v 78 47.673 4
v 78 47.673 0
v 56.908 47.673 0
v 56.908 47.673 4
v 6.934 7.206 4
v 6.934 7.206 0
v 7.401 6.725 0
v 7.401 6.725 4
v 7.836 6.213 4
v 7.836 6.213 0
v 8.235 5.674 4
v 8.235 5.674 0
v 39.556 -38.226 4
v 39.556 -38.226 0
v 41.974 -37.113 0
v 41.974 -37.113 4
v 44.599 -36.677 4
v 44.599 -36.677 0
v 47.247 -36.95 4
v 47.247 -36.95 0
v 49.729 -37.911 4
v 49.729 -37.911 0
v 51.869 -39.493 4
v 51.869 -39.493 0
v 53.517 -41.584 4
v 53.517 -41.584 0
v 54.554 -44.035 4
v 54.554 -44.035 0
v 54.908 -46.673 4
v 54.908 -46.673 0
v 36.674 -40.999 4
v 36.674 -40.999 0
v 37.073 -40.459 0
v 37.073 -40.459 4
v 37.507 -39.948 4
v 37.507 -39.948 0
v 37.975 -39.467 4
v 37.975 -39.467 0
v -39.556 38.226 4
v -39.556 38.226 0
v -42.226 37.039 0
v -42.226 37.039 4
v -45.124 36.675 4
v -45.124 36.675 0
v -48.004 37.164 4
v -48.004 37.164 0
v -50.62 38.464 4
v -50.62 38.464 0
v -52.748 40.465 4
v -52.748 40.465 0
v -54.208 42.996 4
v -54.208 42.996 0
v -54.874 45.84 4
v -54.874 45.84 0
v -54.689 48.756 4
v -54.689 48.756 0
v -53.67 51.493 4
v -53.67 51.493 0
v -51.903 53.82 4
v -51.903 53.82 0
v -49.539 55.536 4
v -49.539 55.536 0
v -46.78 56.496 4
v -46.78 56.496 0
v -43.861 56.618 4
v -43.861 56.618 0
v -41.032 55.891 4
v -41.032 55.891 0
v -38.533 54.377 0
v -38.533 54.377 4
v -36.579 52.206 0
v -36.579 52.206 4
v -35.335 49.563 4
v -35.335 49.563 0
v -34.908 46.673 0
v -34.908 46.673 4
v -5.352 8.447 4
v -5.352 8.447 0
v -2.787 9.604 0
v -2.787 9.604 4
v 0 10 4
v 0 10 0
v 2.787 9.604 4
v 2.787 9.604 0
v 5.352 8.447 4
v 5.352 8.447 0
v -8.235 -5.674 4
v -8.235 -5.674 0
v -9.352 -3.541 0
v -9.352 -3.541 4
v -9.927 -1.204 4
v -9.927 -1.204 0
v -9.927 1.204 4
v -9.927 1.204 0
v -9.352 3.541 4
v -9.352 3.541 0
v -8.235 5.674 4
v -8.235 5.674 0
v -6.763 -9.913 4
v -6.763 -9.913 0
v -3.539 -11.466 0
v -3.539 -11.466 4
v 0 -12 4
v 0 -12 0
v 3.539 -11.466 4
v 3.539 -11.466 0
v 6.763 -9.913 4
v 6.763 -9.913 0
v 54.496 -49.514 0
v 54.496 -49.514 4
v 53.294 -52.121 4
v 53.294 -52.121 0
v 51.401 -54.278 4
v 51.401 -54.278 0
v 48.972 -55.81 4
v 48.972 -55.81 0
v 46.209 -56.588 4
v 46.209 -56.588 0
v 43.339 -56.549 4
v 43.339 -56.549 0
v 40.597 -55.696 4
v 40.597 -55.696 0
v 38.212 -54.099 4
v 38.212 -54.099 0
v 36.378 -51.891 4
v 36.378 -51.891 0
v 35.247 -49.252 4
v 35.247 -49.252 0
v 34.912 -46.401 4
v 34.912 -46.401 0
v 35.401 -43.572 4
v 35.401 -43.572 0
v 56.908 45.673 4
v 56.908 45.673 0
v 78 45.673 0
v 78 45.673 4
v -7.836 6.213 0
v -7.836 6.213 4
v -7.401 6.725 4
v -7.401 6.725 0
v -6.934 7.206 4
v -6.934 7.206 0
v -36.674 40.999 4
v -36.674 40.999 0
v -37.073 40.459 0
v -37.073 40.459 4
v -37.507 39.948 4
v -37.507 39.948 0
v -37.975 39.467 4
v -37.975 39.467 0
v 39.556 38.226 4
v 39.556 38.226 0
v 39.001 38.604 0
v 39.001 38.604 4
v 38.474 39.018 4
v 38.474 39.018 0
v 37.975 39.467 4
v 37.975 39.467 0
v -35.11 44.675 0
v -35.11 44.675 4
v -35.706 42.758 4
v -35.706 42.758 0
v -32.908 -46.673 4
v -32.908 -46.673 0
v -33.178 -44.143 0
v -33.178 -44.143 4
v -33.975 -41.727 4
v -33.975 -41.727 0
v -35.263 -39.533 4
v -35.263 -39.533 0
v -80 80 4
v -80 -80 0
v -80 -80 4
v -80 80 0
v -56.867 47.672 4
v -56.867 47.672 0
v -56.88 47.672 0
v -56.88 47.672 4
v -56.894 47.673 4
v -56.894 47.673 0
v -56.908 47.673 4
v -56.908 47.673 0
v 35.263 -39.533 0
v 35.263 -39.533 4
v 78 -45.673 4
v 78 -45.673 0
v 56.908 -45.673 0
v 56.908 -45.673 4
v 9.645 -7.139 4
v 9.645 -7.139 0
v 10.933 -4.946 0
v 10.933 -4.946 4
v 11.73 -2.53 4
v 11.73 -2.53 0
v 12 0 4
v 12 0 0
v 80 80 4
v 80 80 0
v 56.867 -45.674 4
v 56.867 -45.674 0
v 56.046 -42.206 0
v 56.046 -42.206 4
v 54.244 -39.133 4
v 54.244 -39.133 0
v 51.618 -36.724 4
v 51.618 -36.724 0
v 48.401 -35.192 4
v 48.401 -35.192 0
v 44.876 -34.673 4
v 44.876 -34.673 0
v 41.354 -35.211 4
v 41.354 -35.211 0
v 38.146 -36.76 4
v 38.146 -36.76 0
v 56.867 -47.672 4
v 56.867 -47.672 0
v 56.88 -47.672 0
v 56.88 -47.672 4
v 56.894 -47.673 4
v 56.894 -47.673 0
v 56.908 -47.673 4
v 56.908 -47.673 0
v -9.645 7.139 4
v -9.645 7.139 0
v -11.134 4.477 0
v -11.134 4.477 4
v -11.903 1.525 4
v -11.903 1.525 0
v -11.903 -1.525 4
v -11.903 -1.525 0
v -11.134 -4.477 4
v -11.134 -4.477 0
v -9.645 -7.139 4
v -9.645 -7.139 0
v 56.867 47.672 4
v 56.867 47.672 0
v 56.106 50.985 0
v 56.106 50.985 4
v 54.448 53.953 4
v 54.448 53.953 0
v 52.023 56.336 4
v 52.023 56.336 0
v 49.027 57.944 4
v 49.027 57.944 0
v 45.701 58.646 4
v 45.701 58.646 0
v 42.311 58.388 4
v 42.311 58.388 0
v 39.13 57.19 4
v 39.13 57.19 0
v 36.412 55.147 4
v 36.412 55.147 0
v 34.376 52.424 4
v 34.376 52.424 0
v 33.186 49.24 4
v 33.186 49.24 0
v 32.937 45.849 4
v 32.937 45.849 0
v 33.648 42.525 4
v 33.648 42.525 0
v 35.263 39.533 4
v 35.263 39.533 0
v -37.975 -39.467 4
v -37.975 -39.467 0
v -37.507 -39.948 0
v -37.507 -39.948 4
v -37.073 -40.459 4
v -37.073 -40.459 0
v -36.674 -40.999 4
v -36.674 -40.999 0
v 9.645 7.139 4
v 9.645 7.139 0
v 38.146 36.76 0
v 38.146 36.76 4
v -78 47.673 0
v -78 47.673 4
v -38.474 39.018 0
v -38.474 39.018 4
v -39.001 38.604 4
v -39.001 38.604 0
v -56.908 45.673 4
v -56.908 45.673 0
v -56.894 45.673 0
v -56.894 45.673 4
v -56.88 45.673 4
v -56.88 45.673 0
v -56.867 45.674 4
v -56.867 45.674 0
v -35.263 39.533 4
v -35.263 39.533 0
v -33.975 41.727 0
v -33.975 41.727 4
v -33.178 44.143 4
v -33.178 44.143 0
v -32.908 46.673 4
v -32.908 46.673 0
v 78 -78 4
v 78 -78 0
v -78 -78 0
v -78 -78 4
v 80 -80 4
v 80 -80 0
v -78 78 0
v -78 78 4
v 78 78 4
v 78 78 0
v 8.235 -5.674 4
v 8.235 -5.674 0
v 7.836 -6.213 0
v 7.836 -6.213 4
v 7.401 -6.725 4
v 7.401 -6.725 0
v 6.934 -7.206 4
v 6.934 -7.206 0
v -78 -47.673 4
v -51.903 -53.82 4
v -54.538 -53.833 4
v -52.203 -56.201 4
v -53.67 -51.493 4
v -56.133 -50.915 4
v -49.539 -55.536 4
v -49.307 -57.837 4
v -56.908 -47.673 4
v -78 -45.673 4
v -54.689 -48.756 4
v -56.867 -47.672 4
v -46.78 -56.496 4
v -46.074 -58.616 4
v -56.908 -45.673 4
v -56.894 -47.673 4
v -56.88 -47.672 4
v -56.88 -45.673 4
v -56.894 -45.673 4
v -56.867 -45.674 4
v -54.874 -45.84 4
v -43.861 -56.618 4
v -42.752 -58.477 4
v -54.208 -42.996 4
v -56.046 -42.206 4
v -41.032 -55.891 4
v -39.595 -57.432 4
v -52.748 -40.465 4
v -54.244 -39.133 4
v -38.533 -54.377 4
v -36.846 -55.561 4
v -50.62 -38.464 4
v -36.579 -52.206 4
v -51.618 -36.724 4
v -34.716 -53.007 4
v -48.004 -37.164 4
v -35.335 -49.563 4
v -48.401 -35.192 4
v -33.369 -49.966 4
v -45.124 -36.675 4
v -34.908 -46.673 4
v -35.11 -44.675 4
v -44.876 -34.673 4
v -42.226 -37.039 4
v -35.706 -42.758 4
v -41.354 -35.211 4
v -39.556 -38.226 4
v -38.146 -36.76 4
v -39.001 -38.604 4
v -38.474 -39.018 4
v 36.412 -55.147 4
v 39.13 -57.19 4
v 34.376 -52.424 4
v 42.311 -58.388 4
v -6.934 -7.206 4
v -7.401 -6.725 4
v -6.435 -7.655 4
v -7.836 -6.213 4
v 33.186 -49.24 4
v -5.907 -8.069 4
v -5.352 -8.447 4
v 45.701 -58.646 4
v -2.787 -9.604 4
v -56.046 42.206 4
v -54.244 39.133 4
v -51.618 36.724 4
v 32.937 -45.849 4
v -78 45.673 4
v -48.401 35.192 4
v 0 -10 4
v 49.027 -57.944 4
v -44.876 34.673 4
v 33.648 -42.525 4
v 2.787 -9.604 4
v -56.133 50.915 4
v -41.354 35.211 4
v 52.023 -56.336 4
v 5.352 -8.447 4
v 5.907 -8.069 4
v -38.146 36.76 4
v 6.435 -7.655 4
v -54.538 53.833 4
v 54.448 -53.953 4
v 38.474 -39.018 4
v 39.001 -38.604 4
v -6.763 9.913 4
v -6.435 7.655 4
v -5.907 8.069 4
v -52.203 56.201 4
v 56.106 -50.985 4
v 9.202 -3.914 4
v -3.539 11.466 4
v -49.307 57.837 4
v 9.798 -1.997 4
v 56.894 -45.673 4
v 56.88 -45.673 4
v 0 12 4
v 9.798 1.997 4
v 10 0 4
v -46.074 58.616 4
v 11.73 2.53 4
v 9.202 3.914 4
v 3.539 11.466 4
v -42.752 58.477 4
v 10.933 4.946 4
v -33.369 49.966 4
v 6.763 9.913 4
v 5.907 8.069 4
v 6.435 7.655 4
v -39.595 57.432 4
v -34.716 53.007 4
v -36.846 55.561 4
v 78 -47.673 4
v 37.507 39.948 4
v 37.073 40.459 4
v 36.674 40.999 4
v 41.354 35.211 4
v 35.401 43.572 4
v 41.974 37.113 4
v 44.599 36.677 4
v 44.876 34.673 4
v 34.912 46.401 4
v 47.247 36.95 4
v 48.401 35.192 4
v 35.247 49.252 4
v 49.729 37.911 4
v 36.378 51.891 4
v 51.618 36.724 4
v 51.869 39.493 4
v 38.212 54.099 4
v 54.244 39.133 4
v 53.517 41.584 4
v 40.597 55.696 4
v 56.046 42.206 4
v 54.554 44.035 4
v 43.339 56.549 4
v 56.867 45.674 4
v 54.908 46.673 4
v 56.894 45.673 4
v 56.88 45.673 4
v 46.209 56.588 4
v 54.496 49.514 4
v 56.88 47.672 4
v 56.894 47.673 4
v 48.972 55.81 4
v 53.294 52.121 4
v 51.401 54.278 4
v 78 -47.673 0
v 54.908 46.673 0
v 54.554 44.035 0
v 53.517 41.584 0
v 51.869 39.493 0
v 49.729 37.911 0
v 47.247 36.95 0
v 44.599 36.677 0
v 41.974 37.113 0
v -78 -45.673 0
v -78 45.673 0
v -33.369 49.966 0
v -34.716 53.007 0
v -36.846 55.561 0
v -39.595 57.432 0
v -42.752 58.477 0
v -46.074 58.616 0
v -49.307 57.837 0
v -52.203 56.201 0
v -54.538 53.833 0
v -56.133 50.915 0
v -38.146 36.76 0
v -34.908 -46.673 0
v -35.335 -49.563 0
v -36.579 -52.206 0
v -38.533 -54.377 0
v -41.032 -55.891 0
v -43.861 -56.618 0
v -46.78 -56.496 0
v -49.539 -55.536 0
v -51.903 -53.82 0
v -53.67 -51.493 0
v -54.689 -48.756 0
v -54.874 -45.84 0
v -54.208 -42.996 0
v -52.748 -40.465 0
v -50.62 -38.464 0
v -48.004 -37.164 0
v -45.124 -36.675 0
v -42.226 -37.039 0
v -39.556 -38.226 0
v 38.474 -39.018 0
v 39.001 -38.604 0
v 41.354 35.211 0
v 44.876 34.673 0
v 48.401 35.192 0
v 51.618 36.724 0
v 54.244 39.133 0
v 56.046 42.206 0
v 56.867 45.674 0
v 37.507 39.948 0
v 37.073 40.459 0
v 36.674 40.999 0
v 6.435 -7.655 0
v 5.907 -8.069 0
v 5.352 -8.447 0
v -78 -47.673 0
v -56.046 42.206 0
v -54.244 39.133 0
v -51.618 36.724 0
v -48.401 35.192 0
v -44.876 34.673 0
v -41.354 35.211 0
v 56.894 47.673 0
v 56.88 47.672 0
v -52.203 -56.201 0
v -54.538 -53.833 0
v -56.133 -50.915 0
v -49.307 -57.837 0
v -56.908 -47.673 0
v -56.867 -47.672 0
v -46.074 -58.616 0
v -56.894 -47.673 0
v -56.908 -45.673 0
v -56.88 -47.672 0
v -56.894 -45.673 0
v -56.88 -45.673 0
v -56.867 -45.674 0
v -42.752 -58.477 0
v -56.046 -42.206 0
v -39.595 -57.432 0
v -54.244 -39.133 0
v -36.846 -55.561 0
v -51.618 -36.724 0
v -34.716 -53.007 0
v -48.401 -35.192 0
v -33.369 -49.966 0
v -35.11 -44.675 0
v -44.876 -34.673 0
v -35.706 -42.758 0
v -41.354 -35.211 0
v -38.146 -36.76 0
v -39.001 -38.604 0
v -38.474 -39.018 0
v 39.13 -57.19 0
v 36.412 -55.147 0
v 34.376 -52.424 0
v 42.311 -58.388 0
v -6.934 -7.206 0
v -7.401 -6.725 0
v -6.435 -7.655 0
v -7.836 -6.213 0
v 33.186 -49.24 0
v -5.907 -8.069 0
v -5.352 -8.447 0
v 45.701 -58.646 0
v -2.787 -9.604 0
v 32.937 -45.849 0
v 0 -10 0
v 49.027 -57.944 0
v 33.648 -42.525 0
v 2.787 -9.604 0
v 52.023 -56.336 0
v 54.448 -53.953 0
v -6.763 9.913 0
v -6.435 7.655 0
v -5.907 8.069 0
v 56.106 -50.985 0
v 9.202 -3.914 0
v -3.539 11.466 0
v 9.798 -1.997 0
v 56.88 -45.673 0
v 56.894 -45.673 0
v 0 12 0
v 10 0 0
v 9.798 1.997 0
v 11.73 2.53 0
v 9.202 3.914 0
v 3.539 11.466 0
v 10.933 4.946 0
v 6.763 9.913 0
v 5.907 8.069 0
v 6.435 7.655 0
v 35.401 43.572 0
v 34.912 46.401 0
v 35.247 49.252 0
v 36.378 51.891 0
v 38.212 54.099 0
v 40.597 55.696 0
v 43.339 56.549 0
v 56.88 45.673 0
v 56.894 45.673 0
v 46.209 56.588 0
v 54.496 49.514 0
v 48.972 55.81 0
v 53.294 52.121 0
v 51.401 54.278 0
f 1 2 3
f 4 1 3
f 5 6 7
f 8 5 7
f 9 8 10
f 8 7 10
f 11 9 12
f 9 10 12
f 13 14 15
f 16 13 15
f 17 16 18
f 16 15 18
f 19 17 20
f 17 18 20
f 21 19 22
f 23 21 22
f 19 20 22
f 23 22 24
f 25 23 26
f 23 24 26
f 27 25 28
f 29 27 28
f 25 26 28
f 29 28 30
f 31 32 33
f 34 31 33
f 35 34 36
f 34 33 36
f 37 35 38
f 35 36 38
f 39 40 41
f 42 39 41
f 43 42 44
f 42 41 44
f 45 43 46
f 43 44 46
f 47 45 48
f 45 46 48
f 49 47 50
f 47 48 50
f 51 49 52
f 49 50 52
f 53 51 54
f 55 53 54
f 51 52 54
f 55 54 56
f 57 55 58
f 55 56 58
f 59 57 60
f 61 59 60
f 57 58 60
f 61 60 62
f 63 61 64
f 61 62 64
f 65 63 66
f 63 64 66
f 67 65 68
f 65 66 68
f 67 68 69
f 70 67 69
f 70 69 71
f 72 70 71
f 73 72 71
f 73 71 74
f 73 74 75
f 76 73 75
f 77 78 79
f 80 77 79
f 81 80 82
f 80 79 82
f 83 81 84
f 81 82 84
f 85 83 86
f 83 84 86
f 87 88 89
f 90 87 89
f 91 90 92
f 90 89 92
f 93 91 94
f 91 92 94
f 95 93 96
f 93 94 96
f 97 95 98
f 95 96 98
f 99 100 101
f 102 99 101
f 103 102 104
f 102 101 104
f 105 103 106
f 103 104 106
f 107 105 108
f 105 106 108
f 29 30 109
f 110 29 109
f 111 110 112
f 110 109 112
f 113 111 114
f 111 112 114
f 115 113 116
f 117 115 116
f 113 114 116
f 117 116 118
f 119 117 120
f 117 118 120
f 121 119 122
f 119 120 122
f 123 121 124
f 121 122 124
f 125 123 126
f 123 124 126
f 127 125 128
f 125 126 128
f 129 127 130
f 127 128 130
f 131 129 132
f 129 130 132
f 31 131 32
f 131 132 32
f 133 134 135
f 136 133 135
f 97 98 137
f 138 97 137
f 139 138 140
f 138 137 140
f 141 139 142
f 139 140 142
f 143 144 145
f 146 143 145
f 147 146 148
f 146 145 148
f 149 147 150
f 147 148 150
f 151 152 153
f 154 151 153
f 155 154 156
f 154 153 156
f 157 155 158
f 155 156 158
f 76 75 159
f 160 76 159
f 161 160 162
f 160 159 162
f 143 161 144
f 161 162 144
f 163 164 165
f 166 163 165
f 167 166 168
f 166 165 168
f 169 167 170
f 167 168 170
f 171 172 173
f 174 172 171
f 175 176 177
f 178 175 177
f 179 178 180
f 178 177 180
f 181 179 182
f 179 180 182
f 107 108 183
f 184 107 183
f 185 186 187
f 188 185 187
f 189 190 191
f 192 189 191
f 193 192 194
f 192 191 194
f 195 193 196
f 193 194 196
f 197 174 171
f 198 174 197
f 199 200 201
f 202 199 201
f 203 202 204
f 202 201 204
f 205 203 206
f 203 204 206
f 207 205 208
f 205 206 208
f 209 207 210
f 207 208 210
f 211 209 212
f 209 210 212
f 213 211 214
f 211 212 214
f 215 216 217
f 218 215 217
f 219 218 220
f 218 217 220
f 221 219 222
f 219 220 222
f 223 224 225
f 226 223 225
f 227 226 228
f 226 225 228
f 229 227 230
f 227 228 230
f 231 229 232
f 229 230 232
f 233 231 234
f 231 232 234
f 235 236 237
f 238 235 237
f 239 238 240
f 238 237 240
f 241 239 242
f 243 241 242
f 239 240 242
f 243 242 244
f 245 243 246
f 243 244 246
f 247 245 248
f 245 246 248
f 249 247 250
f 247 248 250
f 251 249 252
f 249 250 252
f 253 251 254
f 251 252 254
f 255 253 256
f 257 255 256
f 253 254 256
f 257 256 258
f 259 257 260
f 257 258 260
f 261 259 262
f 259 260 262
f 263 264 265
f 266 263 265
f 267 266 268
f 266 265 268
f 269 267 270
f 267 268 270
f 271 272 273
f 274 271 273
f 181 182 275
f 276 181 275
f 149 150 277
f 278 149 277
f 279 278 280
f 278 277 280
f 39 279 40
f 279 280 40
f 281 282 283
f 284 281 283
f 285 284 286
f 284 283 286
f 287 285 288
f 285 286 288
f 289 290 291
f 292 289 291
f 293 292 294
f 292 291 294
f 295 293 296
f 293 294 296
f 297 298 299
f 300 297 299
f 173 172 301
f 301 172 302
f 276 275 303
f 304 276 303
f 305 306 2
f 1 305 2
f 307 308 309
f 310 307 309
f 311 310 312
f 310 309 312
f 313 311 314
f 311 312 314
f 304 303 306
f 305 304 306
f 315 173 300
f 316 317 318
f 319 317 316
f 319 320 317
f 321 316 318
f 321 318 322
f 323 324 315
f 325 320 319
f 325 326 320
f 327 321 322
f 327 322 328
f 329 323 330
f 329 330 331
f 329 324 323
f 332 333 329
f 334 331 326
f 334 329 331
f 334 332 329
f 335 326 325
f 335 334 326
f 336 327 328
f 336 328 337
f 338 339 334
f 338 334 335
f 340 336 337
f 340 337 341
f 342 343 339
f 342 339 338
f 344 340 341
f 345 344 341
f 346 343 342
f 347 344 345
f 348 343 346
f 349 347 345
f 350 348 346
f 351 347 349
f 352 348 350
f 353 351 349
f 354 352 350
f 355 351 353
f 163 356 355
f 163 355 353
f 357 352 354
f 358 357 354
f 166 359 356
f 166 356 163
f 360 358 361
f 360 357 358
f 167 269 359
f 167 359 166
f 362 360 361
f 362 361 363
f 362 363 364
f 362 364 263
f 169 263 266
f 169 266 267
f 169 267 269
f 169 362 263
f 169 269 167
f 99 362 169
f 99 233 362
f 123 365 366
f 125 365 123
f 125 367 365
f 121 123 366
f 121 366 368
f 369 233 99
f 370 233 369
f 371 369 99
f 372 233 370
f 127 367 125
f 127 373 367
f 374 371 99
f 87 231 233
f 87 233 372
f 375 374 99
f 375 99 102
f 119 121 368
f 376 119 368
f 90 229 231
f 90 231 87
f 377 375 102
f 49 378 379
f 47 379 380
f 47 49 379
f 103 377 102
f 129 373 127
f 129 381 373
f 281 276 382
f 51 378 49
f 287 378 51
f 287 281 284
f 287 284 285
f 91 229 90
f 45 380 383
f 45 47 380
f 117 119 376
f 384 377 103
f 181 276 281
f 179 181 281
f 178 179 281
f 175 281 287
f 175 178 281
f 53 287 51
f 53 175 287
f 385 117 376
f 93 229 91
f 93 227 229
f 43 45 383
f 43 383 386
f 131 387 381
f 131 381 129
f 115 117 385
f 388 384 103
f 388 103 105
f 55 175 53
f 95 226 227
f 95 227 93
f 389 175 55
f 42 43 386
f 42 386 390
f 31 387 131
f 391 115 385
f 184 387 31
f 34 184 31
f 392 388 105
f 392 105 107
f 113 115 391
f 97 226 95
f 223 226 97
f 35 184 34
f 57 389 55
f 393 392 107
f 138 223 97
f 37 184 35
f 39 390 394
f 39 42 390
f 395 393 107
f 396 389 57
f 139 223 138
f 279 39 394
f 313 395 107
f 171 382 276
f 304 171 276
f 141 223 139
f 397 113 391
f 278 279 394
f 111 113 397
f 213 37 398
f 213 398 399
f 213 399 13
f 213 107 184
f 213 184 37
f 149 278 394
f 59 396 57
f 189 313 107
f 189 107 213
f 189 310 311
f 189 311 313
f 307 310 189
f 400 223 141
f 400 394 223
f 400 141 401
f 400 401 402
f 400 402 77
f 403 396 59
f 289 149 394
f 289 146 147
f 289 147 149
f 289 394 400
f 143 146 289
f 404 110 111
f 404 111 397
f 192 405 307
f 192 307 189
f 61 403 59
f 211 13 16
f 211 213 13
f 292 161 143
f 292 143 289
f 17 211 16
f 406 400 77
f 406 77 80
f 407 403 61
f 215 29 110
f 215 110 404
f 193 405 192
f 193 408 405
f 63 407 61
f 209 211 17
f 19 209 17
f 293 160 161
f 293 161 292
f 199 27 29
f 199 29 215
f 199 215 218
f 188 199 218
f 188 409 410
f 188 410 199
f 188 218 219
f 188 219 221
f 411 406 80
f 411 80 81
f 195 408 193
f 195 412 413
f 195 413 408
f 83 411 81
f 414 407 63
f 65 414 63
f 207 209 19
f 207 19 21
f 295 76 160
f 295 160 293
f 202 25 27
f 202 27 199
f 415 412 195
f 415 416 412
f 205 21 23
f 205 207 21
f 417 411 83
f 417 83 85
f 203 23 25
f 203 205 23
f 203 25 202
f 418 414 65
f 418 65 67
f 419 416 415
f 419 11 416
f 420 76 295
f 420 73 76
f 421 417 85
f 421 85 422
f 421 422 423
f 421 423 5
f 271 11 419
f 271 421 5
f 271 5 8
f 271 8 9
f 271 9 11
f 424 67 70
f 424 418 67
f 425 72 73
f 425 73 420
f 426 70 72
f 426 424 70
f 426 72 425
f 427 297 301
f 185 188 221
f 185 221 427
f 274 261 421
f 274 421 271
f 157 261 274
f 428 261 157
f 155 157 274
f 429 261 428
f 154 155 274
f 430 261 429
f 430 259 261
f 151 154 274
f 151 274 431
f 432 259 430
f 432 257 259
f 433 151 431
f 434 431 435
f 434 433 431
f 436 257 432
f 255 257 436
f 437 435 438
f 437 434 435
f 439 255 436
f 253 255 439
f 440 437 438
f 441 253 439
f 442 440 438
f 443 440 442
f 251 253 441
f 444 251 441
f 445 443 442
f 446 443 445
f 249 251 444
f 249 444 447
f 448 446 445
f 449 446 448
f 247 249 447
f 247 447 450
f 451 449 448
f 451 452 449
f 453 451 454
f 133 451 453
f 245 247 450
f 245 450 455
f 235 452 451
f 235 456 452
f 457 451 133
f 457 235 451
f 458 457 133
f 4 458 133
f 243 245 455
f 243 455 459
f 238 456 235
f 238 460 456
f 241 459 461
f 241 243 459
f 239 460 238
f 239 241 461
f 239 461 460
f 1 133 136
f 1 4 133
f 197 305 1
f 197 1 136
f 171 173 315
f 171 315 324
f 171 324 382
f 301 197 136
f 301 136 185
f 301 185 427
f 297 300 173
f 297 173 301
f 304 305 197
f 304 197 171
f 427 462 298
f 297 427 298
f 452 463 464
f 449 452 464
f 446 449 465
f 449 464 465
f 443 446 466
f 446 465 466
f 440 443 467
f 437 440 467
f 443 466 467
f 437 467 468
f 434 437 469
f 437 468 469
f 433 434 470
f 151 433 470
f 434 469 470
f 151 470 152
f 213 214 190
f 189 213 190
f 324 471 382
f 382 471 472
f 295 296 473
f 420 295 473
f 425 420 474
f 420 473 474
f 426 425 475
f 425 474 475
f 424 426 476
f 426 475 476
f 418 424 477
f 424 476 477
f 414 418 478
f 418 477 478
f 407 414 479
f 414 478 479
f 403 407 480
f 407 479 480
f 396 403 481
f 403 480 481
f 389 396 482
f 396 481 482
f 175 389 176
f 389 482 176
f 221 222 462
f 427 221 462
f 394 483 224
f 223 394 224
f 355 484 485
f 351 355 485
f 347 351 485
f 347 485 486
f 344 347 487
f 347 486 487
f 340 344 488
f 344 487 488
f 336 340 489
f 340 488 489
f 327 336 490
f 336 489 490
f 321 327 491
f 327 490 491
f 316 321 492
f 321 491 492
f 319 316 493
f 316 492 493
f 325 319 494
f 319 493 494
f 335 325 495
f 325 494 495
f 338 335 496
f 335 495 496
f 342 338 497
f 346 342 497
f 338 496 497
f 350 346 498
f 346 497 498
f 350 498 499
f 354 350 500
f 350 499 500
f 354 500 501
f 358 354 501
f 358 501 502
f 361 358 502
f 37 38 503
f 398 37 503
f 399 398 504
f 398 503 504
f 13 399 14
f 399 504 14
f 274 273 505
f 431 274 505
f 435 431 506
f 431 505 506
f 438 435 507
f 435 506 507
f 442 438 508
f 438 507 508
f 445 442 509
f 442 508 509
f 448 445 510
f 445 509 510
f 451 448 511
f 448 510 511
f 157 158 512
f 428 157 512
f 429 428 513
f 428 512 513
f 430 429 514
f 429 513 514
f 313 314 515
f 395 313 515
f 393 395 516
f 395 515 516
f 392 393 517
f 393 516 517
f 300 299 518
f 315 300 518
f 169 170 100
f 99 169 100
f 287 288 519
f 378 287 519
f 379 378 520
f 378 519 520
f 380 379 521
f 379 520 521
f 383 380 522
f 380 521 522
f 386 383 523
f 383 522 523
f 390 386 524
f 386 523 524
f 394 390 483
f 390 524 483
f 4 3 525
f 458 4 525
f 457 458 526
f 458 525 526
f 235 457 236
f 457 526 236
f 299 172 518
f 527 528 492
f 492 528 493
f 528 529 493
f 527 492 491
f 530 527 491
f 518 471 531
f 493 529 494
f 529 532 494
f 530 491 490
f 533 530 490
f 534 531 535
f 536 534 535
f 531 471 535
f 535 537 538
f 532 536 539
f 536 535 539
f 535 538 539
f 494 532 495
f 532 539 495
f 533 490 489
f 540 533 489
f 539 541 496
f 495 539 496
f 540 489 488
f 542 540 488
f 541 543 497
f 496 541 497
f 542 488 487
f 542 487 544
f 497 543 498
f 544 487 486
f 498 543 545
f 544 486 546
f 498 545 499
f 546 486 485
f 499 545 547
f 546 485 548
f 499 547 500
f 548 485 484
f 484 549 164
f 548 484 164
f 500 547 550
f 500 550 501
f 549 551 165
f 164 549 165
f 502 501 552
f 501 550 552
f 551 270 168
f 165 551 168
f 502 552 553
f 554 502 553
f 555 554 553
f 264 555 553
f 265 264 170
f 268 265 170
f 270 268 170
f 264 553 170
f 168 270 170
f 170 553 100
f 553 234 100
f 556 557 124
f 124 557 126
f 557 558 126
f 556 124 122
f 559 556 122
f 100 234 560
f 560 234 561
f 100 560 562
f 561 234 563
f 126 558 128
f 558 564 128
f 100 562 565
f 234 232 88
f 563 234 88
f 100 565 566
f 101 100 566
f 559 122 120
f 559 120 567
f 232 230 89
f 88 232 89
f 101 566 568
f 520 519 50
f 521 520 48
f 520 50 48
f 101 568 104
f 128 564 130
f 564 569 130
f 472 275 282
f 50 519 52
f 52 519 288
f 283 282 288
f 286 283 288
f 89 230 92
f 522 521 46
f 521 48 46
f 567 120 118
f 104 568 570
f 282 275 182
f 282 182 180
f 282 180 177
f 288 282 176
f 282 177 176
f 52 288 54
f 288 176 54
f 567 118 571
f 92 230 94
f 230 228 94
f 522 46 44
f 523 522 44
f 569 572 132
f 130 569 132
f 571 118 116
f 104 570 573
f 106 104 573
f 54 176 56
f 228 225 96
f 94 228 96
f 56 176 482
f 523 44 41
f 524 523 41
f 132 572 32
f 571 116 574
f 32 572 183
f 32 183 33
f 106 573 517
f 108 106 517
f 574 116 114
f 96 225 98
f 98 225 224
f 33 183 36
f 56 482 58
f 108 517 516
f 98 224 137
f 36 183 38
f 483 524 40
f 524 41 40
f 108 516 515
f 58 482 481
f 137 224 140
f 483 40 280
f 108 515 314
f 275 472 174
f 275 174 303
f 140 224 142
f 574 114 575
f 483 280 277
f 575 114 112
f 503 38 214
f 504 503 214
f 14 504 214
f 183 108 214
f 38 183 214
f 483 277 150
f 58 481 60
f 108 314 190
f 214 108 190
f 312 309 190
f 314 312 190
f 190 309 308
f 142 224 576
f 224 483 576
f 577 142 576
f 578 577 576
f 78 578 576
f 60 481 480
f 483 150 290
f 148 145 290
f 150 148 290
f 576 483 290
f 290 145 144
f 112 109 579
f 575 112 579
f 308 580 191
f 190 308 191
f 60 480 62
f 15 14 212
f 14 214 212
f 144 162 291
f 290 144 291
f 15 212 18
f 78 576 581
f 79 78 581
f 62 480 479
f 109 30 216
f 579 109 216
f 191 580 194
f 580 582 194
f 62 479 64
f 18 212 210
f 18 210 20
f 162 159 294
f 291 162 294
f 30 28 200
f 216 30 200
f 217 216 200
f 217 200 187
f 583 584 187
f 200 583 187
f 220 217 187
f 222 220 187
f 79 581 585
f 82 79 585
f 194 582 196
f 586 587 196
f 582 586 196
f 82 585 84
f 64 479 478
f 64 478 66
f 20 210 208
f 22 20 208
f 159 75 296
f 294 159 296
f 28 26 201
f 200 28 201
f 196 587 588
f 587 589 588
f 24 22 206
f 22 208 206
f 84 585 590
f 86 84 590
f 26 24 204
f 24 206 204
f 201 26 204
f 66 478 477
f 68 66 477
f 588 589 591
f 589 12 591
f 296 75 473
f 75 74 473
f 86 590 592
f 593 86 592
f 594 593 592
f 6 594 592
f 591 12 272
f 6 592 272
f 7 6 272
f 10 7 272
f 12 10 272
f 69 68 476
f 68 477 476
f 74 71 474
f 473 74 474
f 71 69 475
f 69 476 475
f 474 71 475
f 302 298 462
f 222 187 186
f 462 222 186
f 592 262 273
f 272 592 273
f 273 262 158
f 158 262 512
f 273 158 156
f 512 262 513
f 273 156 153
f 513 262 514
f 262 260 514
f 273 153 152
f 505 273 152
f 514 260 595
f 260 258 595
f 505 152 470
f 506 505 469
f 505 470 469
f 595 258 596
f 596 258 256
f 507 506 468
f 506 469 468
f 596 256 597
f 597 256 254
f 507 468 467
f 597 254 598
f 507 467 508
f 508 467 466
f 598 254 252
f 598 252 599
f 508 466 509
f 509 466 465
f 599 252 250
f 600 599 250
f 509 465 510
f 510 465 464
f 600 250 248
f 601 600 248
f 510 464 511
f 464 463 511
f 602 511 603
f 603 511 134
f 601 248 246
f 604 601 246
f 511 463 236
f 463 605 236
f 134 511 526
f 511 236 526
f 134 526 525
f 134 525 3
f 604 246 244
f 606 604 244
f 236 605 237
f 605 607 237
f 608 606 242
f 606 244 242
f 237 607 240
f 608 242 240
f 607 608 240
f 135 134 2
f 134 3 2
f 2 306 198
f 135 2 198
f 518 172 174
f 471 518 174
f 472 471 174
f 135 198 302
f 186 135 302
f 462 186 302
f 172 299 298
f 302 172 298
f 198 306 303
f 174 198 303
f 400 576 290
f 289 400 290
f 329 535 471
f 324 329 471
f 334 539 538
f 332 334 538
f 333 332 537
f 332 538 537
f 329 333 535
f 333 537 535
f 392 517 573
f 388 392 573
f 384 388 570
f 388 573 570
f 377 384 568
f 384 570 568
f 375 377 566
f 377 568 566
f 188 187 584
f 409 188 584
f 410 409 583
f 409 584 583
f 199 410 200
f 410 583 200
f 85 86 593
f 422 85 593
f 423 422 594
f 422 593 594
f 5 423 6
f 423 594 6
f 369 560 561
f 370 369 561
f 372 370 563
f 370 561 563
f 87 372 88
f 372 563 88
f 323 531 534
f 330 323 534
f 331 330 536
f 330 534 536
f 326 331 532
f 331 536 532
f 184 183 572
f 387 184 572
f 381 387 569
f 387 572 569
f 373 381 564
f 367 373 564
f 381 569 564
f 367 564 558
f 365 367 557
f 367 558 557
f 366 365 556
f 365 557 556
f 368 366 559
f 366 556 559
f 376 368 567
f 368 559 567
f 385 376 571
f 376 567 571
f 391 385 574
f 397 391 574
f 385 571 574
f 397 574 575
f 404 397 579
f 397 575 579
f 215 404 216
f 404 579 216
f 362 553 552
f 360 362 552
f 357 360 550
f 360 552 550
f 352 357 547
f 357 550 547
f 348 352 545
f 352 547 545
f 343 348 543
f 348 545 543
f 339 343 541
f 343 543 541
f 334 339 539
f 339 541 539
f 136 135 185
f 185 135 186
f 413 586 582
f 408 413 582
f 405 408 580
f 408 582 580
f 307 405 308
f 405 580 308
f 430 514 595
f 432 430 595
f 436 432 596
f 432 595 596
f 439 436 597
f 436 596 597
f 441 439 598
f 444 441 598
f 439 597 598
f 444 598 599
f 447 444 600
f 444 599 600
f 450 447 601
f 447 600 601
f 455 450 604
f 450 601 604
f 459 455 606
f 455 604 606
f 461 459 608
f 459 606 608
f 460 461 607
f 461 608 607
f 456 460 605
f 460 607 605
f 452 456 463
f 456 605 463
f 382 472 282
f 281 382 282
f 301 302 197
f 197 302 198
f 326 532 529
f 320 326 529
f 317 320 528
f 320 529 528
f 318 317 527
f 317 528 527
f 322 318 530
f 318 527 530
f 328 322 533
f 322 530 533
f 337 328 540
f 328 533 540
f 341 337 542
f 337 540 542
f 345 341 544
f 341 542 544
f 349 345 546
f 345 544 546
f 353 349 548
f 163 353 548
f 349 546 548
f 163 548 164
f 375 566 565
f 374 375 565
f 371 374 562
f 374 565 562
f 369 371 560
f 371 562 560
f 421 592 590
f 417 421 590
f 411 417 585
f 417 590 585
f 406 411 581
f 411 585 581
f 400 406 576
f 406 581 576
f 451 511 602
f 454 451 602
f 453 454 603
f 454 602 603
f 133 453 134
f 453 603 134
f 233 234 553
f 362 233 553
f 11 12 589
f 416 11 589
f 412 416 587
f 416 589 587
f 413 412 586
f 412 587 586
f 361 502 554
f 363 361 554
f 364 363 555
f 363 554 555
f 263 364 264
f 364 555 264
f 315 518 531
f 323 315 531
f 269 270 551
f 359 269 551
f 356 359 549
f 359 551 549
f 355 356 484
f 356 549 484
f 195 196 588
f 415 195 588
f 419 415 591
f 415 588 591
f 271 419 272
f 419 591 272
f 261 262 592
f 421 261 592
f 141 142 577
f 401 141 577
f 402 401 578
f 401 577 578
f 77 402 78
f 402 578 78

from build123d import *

# Parameters (mm, degrees)
F0_W     = 160
F0_H     = 160
F1_DEPTH = 4


with BuildPart() as f1:
    # F0 (on Top) → F1 (new body)
    with BuildSketch(Plane.XY):
        Rectangle(F0_W, F0_H)
        Polygon((78, -47.6726496816), (78, -78), (-78, -78), (-78, -47.6726496816), (-78, -45.6726496816), (-78, 45.6726496816), (-78, 47.6726496816), (-78, 78), (78, 78), (78, 47.6726496816), (78, 45.6726496816), (78, -45.6726496816), align=None, mode=Mode.SUBTRACT)
        with BuildLine():
            Line((-36.673598985, -40.9989881886), (-35.2631757885, -39.5331510668))
            ThreePointArc((-35.2631757885, -39.5331510668), (-35.8940102443, -38.7515774449), (-36.5879950856, -38.0254958538))
            Line((-36.5879950856, -38.0254958538), (-37.9747051278, -39.4666881584))
            ThreePointArc((-37.9747051278, -39.4666881584), (-37.2855518522, -40.2000619797), (-36.673598985, -40.9989881886))
        make_face()
        with BuildLine():
            ThreePointArc((-36.5879950856, -38.0254958538), (-37.3402685176, -37.3599929459), (-38.1455603978, -36.7597309824))
            Line((-38.1455603978, -36.7597309824), (-39.5559835942, -38.2255681043))
            ThreePointArc((-39.5559835942, -38.2255681043), (-38.7340792781, -38.8062941103), (-37.9747051278, -39.4666881584))
            Line((-37.9747051278, -39.4666881584), (-36.5879950856, -38.0254958538))
        make_face()
        with BuildLine():
            ThreePointArc((-56.866588672, -45.6735181142), (-56.9082553387, -46.6726496816), (-56.866588672, -47.6717812489))
            ThreePointArc((-56.866588672, -47.6717812489), (-44.4082553387, -58.6622284898), (-32.9082553387, -46.6726496816))
            ThreePointArc((-32.9082553387, -46.6726496816), (-33.5121824492, -42.9137239442), (-35.2631757885, -39.5331510668))
            Line((-35.2631757885, -39.5331510668), (-36.673598985, -40.9989881886))
            ThreePointArc((-36.673598985, -40.9989881886), (-35.3597852116, -43.7016703428), (-34.9082553387, -46.6726496816))
            ThreePointArc((-34.9082553387, -46.6726496816), (-53.6696113252, -51.4932970736), (-39.5559835942, -38.2255681043))
            Line((-39.5559835942, -38.2255681043), (-38.1455603978, -36.7597309824))
            ThreePointArc((-38.1455603978, -36.7597309824), (-50.0669920866, -35.83810146), (-56.866588672, -45.6735181142))
        make_face()
        with BuildLine():
            Line((8.2346563537, 5.673661493), (9.6450795502, 7.1394986148))
            ThreePointArc((9.6450795502, 7.1394986148), (9.0142450944, 7.9210722367), (8.3202602531, 8.6471538278))
            Line((8.3202602531, 8.6471538278), (6.9335502109, 7.2059615232))
            ThreePointArc((6.9335502109, 7.2059615232), (7.6227034864, 6.4725877018), (8.2346563537, 5.673661493))
        make_face()
        with BuildLine():
            ThreePointArc((8.3202602531, 8.6471538278), (7.567986821, 9.3126567357), (6.7626949409, 9.9129186992))
            Line((6.7626949409, 9.9129186992), (5.3522717444, 8.4470815773))
            ThreePointArc((5.3522717444, 8.4470815773), (6.1741760605, 7.8663555713), (6.9335502109, 7.2059615232))
            Line((6.9335502109, 7.2059615232), (8.3202602531, 8.6471538278))
        make_face()
        with BuildLine():
            Line((5.3522717444, 8.4470815773), (6.7626949409, 9.9129186992))
            ThreePointArc((6.7626949409, 9.9129186992), (0, 12), (-6.7626949409, 9.9129186992))
            Line((-6.7626949409, 9.9129186992), (-5.3522717444, 8.4470815773))
            ThreePointArc((-5.3522717444, 8.4470815773), (0, 10), (5.3522717444, 8.4470815773))
        make_face()
        with BuildLine():
            ThreePointArc((-6.7626949409, 9.9129186992), (-7.567986821, 9.3126567357), (-8.3202602531, 8.6471538278))
            Line((-8.3202602531, 8.6471538278), (-6.9335502109, 7.2059615232))
            ThreePointArc((-6.9335502109, 7.2059615232), (-6.1741760605, 7.8663555713), (-5.3522717444, 8.4470815773))
            Line((-5.3522717444, 8.4470815773), (-6.7626949409, 9.9129186992))
        make_face()
        with BuildLine():
            ThreePointArc((-8.3202602531, 8.6471538278), (-9.0142450944, 7.9210722367), (-9.6450795502, 7.1394986148))
            Line((-9.6450795502, 7.1394986148), (-8.2346563537, 5.673661493))
            ThreePointArc((-8.2346563537, 5.673661493), (-7.6227034864, 6.4725877018), (-6.9335502109, 7.2059615232))
            Line((-6.9335502109, 7.2059615232), (-8.3202602531, 8.6471538278))
        make_face()
        with BuildLine():
            ThreePointArc((-9.6450795502, 7.1394986148), (-12, 0), (-9.6450795502, -7.1394986148))
            Line((-9.6450795502, -7.1394986148), (-8.2346563537, -5.673661493))
            ThreePointArc((-8.2346563537, -5.673661493), (-10, 0), (-8.2346563537, 5.673661493))
            Line((-8.2346563537, 5.673661493), (-9.6450795502, 7.1394986148))
        make_face()
        with BuildLine():
            Line((-8.2346563537, -5.673661493), (-9.6450795502, -7.1394986148))
            ThreePointArc((-9.6450795502, -7.1394986148), (-9.0142450944, -7.9210722367), (-8.3202602531, -8.6471538278))
            Line((-8.3202602531, -8.6471538278), (-6.9335502109, -7.2059615232))
            ThreePointArc((-6.9335502109, -7.2059615232), (-7.6227034864, -6.4725877018), (-8.2346563537, -5.673661493))
        make_face()
        with BuildLine():
            ThreePointArc((-8.3202602531, -8.6471538278), (-7.567986821, -9.3126567357), (-6.7626949409, -9.9129186992))
            Line((-6.7626949409, -9.9129186992), (-5.3522717444, -8.4470815773))
            ThreePointArc((-5.3522717444, -8.4470815773), (-6.1741760605, -7.8663555713), (-6.9335502109, -7.2059615232))
            Line((-6.9335502109, -7.2059615232), (-8.3202602531, -8.6471538278))
        make_face()
        with BuildLine():
            ThreePointArc((-6.7626949409, -9.9129186992), (0, -12), (6.7626949409, -9.9129186992))
            Line((6.7626949409, -9.9129186992), (5.3522717444, -8.4470815773))
            ThreePointArc((5.3522717444, -8.4470815773), (0, -10), (-5.3522717444, -8.4470815773))
            Line((-5.3522717444, -8.4470815773), (-6.7626949409, -9.9129186992))
        make_face()
        with BuildLine():
            Line((5.3522717444, -8.4470815773), (6.7626949409, -9.9129186992))
            ThreePointArc((6.7626949409, -9.9129186992), (7.567986821, -9.3126567357), (8.3202602531, -8.6471538278))
            Line((8.3202602531, -8.6471538278), (6.9335502109, -7.2059615232))
            ThreePointArc((6.9335502109, -7.2059615232), (6.1741760605, -7.8663555713), (5.3522717444, -8.4470815773))
        make_face()
        with BuildLine():
            ThreePointArc((8.3202602531, -8.6471538278), (9.0142450944, -7.9210722367), (9.6450795502, -7.1394986148))
            Line((9.6450795502, -7.1394986148), (8.2346563537, -5.673661493))
            ThreePointArc((8.2346563537, -5.673661493), (7.6227034864, -6.4725877018), (6.9335502109, -7.2059615232))
            Line((6.9335502109, -7.2059615232), (8.3202602531, -8.6471538278))
        make_face()
        with BuildLine():
            Line((8.2346563537, -5.673661493), (9.6450795502, -7.1394986148))
            ThreePointArc((9.6450795502, -7.1394986148), (11.3960728894, -3.7589257374), (12, 0))
            ThreePointArc((12, 0), (11.3960728894, 3.7589257374), (9.6450795502, 7.1394986148))
            Line((9.6450795502, 7.1394986148), (8.2346563537, 5.673661493))
            ThreePointArc((8.2346563537, 5.673661493), (9.5484701271, 2.9709793388), (10, 0))
            ThreePointArc((10, 0), (9.5484701271, -2.9709793388), (8.2346563537, -5.673661493))
        make_face()
        with BuildLine():
            Line((39.5559835942, -38.2255681043), (38.1455603978, -36.7597309824))
            ThreePointArc((38.1455603978, -36.7597309824), (37.3402685176, -37.3599929459), (36.5879950856, -38.0254958538))
            Line((36.5879950856, -38.0254958538), (37.9747051278, -39.4666881584))
            ThreePointArc((37.9747051278, -39.4666881584), (38.7340792781, -38.8062941103), (39.5559835942, -38.2255681043))
        make_face()
        with BuildLine():
            ThreePointArc((36.5879950856, -38.0254958538), (35.8940102443, -38.7515774449), (35.2631757885, -39.5331510668))
            Line((35.2631757885, -39.5331510668), (36.673598985, -40.9989881886))
            ThreePointArc((36.673598985, -40.9989881886), (37.2855518522, -40.2000619797), (37.9747051278, -39.4666881584))
            Line((37.9747051278, -39.4666881584), (36.5879950856, -38.0254958538))
        make_face()
        with BuildLine():
            ThreePointArc((35.2631757885, -39.5331510668), (40.6777576047, -57.9022039436), (56.866588672, -47.6717812489))
            ThreePointArc((56.866588672, -47.6717812489), (56.897834147, -47.1726496816), (56.9082553387, -46.6726496816))
            ThreePointArc((56.9082553387, -46.6726496816), (56.897834147, -46.1726496816), (56.866588672, -45.6735181142))
            ThreePointArc((56.866588672, -45.6735181142), (50.0669920866, -35.83810146), (38.1455603978, -36.7597309824))
            Line((38.1455603978, -36.7597309824), (39.5559835942, -38.2255681043))
            ThreePointArc((39.5559835942, -38.2255681043), (49.7289027307, -37.9112936951), (54.9082553387, -46.6726496816))
            ThreePointArc((54.9082553387, -46.6726496816), (41.9372759999, -56.2211198087), (36.673598985, -40.9989881886))
            Line((36.673598985, -40.9989881886), (35.2631757885, -39.5331510668))
        make_face()
        with BuildLine():
            Line((36.673598985, 40.9989881886), (35.2631757885, 39.5331510668))
            ThreePointArc((35.2631757885, 39.5331510668), (35.8940102443, 38.7515774449), (36.5879950856, 38.0254958538))
            Line((36.5879950856, 38.0254958538), (37.9747051278, 39.4666881584))
            ThreePointArc((37.9747051278, 39.4666881584), (37.2855518522, 40.2000619797), (36.673598985, 40.9989881886))
        make_face()
        with BuildLine():
            ThreePointArc((36.5879950856, 38.0254958538), (37.3402685176, 37.3599929459), (38.1455603978, 36.7597309824))
            Line((38.1455603978, 36.7597309824), (39.5559835942, 38.2255681043))
            ThreePointArc((39.5559835942, 38.2255681043), (38.7340792781, 38.8062941103), (37.9747051278, 39.4666881584))
            Line((37.9747051278, 39.4666881584), (36.5879950856, 38.0254958538))
        make_face()
        with BuildLine():
            ThreePointArc((38.1455603978, 36.7597309824), (50.0669920866, 35.83810146), (56.866588672, 45.6735181142))
            ThreePointArc((56.866588672, 45.6735181142), (56.897834147, 46.1726496816), (56.9082553387, 46.6726496816))
            ThreePointArc((56.9082553387, 46.6726496816), (56.897834147, 47.1726496816), (56.866588672, 47.6717812489))
            ThreePointArc((56.866588672, 47.6717812489), (40.6777576047, 57.9022039436), (35.2631757885, 39.5331510668))
            Line((35.2631757885, 39.5331510668), (36.673598985, 40.9989881886))
            ThreePointArc((36.673598985, 40.9989881886), (41.9372759999, 56.2211198087), (54.9082553387, 46.6726496816))
            ThreePointArc((54.9082553387, 46.6726496816), (49.7289027307, 37.9112936951), (39.5559835942, 38.2255681043))
            Line((39.5559835942, 38.2255681043), (38.1455603978, 36.7597309824))
        make_face()
        with BuildLine():
            Line((-39.5559835942, 38.2255681043), (-38.1455603978, 36.7597309824))
            ThreePointArc((-38.1455603978, 36.7597309824), (-37.3402685176, 37.3599929459), (-36.5879950856, 38.0254958538))
            Line((-36.5879950856, 38.0254958538), (-37.9747051278, 39.4666881584))
            ThreePointArc((-37.9747051278, 39.4666881584), (-38.7340792781, 38.8062941103), (-39.5559835942, 38.2255681043))
        make_face()
        with BuildLine():
            Line((-37.9747051278, 39.4666881584), (-36.5879950856, 38.0254958538))
            ThreePointArc((-36.5879950856, 38.0254958538), (-35.8940102443, 38.7515774449), (-35.2631757885, 39.5331510668))
            Line((-35.2631757885, 39.5331510668), (-36.673598985, 40.9989881886))
            ThreePointArc((-36.673598985, 40.9989881886), (-37.2855518522, 40.2000619797), (-37.9747051278, 39.4666881584))
        make_face()
        with BuildLine():
            ThreePointArc((-56.866588672, 47.6717812489), (-56.9082553387, 46.6726496816), (-56.866588672, 45.6735181142))
            ThreePointArc((-56.866588672, 45.6735181142), (-50.0669920866, 35.83810146), (-38.1455603978, 36.7597309824))
            Line((-38.1455603978, 36.7597309824), (-39.5559835942, 38.2255681043))
            ThreePointArc((-39.5559835942, 38.2255681043), (-53.6696113252, 51.4932970736), (-34.9082553387, 46.6726496816))
            ThreePointArc((-34.9082553387, 46.6726496816), (-35.3597852116, 43.7016703428), (-36.673598985, 40.9989881886))
            Line((-36.673598985, 40.9989881886), (-35.2631757885, 39.5331510668))
            ThreePointArc((-35.2631757885, 39.5331510668), (-33.5121824492, 42.9137239442), (-32.9082553387, 46.6726496816))
            ThreePointArc((-32.9082553387, 46.6726496816), (-44.4082553387, 58.6622284898), (-56.866588672, 47.6717812489))
        make_face()
        with BuildLine():
            ThreePointArc((-36.5879950856, 38.0254958538), (-37.3402685176, 37.3599929459), (-38.1455603978, 36.7597309824))
            Line((-38.1455603978, 36.7597309824), (-9.6450795502, 7.1394986148))
            ThreePointArc((-9.6450795502, 7.1394986148), (-9.0142450944, 7.9210722367), (-8.3202602531, 8.6471538278))
            Line((-8.3202602531, 8.6471538278), (-36.5879950856, 38.0254958538))
        make_face()
        with BuildLine():
            ThreePointArc((-35.2631757885, 39.5331510668), (-35.8940102443, 38.7515774449), (-36.5879950856, 38.0254958538))
            Line((-36.5879950856, 38.0254958538), (-8.3202602531, 8.6471538278))
            ThreePointArc((-8.3202602531, 8.6471538278), (-7.567986821, 9.3126567357), (-6.7626949409, 9.9129186992))
            Line((-6.7626949409, 9.9129186992), (-35.2631757885, 39.5331510668))
        make_face()
        with BuildLine():
            Line((-9.6450795502, -7.1394986148), (-38.1455603978, -36.7597309824))
            ThreePointArc((-38.1455603978, -36.7597309824), (-37.3402685176, -37.3599929459), (-36.5879950856, -38.0254958538))
            Line((-36.5879950856, -38.0254958538), (-8.3202602531, -8.6471538278))
            ThreePointArc((-8.3202602531, -8.6471538278), (-9.0142450944, -7.9210722367), (-9.6450795502, -7.1394986148))
        make_face()
        with BuildLine():
            ThreePointArc((-36.5879950856, -38.0254958538), (-35.8940102443, -38.7515774449), (-35.2631757885, -39.5331510668))
            Line((-35.2631757885, -39.5331510668), (-6.7626949409, -9.9129186992))
            ThreePointArc((-6.7626949409, -9.9129186992), (-7.567986821, -9.3126567357), (-8.3202602531, -8.6471538278))
            Line((-8.3202602531, -8.6471538278), (-36.5879950856, -38.0254958538))
        make_face()
        with BuildLine():
            Line((6.7626949409, -9.9129186992), (35.2631757885, -39.5331510668))
            ThreePointArc((35.2631757885, -39.5331510668), (35.8940102443, -38.7515774449), (36.5879950856, -38.0254958538))
            Line((36.5879950856, -38.0254958538), (8.3202602531, -8.6471538278))
            ThreePointArc((8.3202602531, -8.6471538278), (7.567986821, -9.3126567357), (6.7626949409, -9.9129186992))
        make_face()
        with BuildLine():
            ThreePointArc((36.5879950856, -38.0254958538), (37.3402685176, -37.3599929459), (38.1455603978, -36.7597309824))
            Line((38.1455603978, -36.7597309824), (9.6450795502, -7.1394986148))
            ThreePointArc((9.6450795502, -7.1394986148), (9.0142450944, -7.9210722367), (8.3202602531, -8.6471538278))
            Line((8.3202602531, -8.6471538278), (36.5879950856, -38.0254958538))
        make_face()
        with BuildLine():
            Line((9.6450795502, 7.1394986148), (38.1455603978, 36.7597309824))
            ThreePointArc((38.1455603978, 36.7597309824), (37.3402685176, 37.3599929459), (36.5879950856, 38.0254958538))
            Line((36.5879950856, 38.0254958538), (8.3202602531, 8.6471538278))
            ThreePointArc((8.3202602531, 8.6471538278), (9.0142450944, 7.9210722367), (9.6450795502, 7.1394986148))
        make_face()
        with BuildLine():
            ThreePointArc((36.5879950856, 38.0254958538), (35.8940102443, 38.7515774449), (35.2631757885, 39.5331510668))
            Line((35.2631757885, 39.5331510668), (6.7626949409, 9.9129186992))
            ThreePointArc((6.7626949409, 9.9129186992), (7.567986821, 9.3126567357), (8.3202602531, 8.6471538278))
            Line((8.3202602531, 8.6471538278), (36.5879950856, 38.0254958538))
        make_face()
        with BuildLine():
            Line((-78, 47.6726496816), (-78, 45.6726496816))
            Line((-78, 45.6726496816), (-56.9082553387, 45.6726496816))
            ThreePointArc((-56.9082553387, 45.6726496816), (-56.8874174808, 45.6728668133), (-56.866588672, 45.6735181142))
            ThreePointArc((-56.866588672, 45.6735181142), (-56.9082553387, 46.6726496816), (-56.866588672, 47.6717812489))
            ThreePointArc((-56.866588672, 47.6717812489), (-56.8874174808, 47.6724325498), (-56.9082553387, 47.6726496816))
            Line((-56.9082553387, 47.6726496816), (-78, 47.6726496816))
        make_face()
        with BuildLine():
            Line((56.9082553387, 45.6726496816), (78, 45.6726496816))
            Line((78, 45.6726496816), (78, 47.6726496816))
            Line((78, 47.6726496816), (56.9082553387, 47.6726496816))
            ThreePointArc((56.9082553387, 47.6726496816), (56.8874174808, 47.6724325498), (56.866588672, 47.6717812489))
            ThreePointArc((56.866588672, 47.6717812489), (56.897834147, 47.1726496816), (56.9082553387, 46.6726496816))
            ThreePointArc((56.9082553387, 46.6726496816), (56.897834147, 46.1726496816), (56.866588672, 45.6735181142))
            ThreePointArc((56.866588672, 45.6735181142), (56.8874174808, 45.6728668133), (56.9082553387, 45.6726496816))
        make_face()
        with BuildLine():
            Line((56.9082553387, -47.6726496816), (78, -47.6726496816))
            Line((78, -47.6726496816), (78, -45.6726496816))
            Line((78, -45.6726496816), (56.9082553387, -45.6726496816))
            ThreePointArc((56.9082553387, -45.6726496816), (56.8874174808, -45.6728668133), (56.866588672, -45.6735181142))
            ThreePointArc((56.866588672, -45.6735181142), (56.897834147, -46.1726496816), (56.9082553387, -46.6726496816))
            ThreePointArc((56.9082553387, -46.6726496816), (56.897834147, -47.1726496816), (56.866588672, -47.6717812489))
            ThreePointArc((56.866588672, -47.6717812489), (56.8874174808, -47.6724325498), (56.9082553387, -47.6726496816))
        make_face()
        with BuildLine():
            Line((-78, -45.6726496816), (-78, -47.6726496816))
            Line((-78, -47.6726496816), (-56.9082553387, -47.6726496816))
            ThreePointArc((-56.9082553387, -47.6726496816), (-56.8874174808, -47.6724325498), (-56.866588672, -47.6717812489))
            ThreePointArc((-56.866588672, -47.6717812489), (-56.9082553387, -46.6726496816), (-56.866588672, -45.6735181142))
            ThreePointArc((-56.866588672, -45.6735181142), (-56.8874174808, -45.6728668133), (-56.9082553387, -45.6726496816))
            Line((-56.9082553387, -45.6726496816), (-78, -45.6726496816))
        make_face()
    extrude(amount=F1_DEPTH)


solid = f1.part
